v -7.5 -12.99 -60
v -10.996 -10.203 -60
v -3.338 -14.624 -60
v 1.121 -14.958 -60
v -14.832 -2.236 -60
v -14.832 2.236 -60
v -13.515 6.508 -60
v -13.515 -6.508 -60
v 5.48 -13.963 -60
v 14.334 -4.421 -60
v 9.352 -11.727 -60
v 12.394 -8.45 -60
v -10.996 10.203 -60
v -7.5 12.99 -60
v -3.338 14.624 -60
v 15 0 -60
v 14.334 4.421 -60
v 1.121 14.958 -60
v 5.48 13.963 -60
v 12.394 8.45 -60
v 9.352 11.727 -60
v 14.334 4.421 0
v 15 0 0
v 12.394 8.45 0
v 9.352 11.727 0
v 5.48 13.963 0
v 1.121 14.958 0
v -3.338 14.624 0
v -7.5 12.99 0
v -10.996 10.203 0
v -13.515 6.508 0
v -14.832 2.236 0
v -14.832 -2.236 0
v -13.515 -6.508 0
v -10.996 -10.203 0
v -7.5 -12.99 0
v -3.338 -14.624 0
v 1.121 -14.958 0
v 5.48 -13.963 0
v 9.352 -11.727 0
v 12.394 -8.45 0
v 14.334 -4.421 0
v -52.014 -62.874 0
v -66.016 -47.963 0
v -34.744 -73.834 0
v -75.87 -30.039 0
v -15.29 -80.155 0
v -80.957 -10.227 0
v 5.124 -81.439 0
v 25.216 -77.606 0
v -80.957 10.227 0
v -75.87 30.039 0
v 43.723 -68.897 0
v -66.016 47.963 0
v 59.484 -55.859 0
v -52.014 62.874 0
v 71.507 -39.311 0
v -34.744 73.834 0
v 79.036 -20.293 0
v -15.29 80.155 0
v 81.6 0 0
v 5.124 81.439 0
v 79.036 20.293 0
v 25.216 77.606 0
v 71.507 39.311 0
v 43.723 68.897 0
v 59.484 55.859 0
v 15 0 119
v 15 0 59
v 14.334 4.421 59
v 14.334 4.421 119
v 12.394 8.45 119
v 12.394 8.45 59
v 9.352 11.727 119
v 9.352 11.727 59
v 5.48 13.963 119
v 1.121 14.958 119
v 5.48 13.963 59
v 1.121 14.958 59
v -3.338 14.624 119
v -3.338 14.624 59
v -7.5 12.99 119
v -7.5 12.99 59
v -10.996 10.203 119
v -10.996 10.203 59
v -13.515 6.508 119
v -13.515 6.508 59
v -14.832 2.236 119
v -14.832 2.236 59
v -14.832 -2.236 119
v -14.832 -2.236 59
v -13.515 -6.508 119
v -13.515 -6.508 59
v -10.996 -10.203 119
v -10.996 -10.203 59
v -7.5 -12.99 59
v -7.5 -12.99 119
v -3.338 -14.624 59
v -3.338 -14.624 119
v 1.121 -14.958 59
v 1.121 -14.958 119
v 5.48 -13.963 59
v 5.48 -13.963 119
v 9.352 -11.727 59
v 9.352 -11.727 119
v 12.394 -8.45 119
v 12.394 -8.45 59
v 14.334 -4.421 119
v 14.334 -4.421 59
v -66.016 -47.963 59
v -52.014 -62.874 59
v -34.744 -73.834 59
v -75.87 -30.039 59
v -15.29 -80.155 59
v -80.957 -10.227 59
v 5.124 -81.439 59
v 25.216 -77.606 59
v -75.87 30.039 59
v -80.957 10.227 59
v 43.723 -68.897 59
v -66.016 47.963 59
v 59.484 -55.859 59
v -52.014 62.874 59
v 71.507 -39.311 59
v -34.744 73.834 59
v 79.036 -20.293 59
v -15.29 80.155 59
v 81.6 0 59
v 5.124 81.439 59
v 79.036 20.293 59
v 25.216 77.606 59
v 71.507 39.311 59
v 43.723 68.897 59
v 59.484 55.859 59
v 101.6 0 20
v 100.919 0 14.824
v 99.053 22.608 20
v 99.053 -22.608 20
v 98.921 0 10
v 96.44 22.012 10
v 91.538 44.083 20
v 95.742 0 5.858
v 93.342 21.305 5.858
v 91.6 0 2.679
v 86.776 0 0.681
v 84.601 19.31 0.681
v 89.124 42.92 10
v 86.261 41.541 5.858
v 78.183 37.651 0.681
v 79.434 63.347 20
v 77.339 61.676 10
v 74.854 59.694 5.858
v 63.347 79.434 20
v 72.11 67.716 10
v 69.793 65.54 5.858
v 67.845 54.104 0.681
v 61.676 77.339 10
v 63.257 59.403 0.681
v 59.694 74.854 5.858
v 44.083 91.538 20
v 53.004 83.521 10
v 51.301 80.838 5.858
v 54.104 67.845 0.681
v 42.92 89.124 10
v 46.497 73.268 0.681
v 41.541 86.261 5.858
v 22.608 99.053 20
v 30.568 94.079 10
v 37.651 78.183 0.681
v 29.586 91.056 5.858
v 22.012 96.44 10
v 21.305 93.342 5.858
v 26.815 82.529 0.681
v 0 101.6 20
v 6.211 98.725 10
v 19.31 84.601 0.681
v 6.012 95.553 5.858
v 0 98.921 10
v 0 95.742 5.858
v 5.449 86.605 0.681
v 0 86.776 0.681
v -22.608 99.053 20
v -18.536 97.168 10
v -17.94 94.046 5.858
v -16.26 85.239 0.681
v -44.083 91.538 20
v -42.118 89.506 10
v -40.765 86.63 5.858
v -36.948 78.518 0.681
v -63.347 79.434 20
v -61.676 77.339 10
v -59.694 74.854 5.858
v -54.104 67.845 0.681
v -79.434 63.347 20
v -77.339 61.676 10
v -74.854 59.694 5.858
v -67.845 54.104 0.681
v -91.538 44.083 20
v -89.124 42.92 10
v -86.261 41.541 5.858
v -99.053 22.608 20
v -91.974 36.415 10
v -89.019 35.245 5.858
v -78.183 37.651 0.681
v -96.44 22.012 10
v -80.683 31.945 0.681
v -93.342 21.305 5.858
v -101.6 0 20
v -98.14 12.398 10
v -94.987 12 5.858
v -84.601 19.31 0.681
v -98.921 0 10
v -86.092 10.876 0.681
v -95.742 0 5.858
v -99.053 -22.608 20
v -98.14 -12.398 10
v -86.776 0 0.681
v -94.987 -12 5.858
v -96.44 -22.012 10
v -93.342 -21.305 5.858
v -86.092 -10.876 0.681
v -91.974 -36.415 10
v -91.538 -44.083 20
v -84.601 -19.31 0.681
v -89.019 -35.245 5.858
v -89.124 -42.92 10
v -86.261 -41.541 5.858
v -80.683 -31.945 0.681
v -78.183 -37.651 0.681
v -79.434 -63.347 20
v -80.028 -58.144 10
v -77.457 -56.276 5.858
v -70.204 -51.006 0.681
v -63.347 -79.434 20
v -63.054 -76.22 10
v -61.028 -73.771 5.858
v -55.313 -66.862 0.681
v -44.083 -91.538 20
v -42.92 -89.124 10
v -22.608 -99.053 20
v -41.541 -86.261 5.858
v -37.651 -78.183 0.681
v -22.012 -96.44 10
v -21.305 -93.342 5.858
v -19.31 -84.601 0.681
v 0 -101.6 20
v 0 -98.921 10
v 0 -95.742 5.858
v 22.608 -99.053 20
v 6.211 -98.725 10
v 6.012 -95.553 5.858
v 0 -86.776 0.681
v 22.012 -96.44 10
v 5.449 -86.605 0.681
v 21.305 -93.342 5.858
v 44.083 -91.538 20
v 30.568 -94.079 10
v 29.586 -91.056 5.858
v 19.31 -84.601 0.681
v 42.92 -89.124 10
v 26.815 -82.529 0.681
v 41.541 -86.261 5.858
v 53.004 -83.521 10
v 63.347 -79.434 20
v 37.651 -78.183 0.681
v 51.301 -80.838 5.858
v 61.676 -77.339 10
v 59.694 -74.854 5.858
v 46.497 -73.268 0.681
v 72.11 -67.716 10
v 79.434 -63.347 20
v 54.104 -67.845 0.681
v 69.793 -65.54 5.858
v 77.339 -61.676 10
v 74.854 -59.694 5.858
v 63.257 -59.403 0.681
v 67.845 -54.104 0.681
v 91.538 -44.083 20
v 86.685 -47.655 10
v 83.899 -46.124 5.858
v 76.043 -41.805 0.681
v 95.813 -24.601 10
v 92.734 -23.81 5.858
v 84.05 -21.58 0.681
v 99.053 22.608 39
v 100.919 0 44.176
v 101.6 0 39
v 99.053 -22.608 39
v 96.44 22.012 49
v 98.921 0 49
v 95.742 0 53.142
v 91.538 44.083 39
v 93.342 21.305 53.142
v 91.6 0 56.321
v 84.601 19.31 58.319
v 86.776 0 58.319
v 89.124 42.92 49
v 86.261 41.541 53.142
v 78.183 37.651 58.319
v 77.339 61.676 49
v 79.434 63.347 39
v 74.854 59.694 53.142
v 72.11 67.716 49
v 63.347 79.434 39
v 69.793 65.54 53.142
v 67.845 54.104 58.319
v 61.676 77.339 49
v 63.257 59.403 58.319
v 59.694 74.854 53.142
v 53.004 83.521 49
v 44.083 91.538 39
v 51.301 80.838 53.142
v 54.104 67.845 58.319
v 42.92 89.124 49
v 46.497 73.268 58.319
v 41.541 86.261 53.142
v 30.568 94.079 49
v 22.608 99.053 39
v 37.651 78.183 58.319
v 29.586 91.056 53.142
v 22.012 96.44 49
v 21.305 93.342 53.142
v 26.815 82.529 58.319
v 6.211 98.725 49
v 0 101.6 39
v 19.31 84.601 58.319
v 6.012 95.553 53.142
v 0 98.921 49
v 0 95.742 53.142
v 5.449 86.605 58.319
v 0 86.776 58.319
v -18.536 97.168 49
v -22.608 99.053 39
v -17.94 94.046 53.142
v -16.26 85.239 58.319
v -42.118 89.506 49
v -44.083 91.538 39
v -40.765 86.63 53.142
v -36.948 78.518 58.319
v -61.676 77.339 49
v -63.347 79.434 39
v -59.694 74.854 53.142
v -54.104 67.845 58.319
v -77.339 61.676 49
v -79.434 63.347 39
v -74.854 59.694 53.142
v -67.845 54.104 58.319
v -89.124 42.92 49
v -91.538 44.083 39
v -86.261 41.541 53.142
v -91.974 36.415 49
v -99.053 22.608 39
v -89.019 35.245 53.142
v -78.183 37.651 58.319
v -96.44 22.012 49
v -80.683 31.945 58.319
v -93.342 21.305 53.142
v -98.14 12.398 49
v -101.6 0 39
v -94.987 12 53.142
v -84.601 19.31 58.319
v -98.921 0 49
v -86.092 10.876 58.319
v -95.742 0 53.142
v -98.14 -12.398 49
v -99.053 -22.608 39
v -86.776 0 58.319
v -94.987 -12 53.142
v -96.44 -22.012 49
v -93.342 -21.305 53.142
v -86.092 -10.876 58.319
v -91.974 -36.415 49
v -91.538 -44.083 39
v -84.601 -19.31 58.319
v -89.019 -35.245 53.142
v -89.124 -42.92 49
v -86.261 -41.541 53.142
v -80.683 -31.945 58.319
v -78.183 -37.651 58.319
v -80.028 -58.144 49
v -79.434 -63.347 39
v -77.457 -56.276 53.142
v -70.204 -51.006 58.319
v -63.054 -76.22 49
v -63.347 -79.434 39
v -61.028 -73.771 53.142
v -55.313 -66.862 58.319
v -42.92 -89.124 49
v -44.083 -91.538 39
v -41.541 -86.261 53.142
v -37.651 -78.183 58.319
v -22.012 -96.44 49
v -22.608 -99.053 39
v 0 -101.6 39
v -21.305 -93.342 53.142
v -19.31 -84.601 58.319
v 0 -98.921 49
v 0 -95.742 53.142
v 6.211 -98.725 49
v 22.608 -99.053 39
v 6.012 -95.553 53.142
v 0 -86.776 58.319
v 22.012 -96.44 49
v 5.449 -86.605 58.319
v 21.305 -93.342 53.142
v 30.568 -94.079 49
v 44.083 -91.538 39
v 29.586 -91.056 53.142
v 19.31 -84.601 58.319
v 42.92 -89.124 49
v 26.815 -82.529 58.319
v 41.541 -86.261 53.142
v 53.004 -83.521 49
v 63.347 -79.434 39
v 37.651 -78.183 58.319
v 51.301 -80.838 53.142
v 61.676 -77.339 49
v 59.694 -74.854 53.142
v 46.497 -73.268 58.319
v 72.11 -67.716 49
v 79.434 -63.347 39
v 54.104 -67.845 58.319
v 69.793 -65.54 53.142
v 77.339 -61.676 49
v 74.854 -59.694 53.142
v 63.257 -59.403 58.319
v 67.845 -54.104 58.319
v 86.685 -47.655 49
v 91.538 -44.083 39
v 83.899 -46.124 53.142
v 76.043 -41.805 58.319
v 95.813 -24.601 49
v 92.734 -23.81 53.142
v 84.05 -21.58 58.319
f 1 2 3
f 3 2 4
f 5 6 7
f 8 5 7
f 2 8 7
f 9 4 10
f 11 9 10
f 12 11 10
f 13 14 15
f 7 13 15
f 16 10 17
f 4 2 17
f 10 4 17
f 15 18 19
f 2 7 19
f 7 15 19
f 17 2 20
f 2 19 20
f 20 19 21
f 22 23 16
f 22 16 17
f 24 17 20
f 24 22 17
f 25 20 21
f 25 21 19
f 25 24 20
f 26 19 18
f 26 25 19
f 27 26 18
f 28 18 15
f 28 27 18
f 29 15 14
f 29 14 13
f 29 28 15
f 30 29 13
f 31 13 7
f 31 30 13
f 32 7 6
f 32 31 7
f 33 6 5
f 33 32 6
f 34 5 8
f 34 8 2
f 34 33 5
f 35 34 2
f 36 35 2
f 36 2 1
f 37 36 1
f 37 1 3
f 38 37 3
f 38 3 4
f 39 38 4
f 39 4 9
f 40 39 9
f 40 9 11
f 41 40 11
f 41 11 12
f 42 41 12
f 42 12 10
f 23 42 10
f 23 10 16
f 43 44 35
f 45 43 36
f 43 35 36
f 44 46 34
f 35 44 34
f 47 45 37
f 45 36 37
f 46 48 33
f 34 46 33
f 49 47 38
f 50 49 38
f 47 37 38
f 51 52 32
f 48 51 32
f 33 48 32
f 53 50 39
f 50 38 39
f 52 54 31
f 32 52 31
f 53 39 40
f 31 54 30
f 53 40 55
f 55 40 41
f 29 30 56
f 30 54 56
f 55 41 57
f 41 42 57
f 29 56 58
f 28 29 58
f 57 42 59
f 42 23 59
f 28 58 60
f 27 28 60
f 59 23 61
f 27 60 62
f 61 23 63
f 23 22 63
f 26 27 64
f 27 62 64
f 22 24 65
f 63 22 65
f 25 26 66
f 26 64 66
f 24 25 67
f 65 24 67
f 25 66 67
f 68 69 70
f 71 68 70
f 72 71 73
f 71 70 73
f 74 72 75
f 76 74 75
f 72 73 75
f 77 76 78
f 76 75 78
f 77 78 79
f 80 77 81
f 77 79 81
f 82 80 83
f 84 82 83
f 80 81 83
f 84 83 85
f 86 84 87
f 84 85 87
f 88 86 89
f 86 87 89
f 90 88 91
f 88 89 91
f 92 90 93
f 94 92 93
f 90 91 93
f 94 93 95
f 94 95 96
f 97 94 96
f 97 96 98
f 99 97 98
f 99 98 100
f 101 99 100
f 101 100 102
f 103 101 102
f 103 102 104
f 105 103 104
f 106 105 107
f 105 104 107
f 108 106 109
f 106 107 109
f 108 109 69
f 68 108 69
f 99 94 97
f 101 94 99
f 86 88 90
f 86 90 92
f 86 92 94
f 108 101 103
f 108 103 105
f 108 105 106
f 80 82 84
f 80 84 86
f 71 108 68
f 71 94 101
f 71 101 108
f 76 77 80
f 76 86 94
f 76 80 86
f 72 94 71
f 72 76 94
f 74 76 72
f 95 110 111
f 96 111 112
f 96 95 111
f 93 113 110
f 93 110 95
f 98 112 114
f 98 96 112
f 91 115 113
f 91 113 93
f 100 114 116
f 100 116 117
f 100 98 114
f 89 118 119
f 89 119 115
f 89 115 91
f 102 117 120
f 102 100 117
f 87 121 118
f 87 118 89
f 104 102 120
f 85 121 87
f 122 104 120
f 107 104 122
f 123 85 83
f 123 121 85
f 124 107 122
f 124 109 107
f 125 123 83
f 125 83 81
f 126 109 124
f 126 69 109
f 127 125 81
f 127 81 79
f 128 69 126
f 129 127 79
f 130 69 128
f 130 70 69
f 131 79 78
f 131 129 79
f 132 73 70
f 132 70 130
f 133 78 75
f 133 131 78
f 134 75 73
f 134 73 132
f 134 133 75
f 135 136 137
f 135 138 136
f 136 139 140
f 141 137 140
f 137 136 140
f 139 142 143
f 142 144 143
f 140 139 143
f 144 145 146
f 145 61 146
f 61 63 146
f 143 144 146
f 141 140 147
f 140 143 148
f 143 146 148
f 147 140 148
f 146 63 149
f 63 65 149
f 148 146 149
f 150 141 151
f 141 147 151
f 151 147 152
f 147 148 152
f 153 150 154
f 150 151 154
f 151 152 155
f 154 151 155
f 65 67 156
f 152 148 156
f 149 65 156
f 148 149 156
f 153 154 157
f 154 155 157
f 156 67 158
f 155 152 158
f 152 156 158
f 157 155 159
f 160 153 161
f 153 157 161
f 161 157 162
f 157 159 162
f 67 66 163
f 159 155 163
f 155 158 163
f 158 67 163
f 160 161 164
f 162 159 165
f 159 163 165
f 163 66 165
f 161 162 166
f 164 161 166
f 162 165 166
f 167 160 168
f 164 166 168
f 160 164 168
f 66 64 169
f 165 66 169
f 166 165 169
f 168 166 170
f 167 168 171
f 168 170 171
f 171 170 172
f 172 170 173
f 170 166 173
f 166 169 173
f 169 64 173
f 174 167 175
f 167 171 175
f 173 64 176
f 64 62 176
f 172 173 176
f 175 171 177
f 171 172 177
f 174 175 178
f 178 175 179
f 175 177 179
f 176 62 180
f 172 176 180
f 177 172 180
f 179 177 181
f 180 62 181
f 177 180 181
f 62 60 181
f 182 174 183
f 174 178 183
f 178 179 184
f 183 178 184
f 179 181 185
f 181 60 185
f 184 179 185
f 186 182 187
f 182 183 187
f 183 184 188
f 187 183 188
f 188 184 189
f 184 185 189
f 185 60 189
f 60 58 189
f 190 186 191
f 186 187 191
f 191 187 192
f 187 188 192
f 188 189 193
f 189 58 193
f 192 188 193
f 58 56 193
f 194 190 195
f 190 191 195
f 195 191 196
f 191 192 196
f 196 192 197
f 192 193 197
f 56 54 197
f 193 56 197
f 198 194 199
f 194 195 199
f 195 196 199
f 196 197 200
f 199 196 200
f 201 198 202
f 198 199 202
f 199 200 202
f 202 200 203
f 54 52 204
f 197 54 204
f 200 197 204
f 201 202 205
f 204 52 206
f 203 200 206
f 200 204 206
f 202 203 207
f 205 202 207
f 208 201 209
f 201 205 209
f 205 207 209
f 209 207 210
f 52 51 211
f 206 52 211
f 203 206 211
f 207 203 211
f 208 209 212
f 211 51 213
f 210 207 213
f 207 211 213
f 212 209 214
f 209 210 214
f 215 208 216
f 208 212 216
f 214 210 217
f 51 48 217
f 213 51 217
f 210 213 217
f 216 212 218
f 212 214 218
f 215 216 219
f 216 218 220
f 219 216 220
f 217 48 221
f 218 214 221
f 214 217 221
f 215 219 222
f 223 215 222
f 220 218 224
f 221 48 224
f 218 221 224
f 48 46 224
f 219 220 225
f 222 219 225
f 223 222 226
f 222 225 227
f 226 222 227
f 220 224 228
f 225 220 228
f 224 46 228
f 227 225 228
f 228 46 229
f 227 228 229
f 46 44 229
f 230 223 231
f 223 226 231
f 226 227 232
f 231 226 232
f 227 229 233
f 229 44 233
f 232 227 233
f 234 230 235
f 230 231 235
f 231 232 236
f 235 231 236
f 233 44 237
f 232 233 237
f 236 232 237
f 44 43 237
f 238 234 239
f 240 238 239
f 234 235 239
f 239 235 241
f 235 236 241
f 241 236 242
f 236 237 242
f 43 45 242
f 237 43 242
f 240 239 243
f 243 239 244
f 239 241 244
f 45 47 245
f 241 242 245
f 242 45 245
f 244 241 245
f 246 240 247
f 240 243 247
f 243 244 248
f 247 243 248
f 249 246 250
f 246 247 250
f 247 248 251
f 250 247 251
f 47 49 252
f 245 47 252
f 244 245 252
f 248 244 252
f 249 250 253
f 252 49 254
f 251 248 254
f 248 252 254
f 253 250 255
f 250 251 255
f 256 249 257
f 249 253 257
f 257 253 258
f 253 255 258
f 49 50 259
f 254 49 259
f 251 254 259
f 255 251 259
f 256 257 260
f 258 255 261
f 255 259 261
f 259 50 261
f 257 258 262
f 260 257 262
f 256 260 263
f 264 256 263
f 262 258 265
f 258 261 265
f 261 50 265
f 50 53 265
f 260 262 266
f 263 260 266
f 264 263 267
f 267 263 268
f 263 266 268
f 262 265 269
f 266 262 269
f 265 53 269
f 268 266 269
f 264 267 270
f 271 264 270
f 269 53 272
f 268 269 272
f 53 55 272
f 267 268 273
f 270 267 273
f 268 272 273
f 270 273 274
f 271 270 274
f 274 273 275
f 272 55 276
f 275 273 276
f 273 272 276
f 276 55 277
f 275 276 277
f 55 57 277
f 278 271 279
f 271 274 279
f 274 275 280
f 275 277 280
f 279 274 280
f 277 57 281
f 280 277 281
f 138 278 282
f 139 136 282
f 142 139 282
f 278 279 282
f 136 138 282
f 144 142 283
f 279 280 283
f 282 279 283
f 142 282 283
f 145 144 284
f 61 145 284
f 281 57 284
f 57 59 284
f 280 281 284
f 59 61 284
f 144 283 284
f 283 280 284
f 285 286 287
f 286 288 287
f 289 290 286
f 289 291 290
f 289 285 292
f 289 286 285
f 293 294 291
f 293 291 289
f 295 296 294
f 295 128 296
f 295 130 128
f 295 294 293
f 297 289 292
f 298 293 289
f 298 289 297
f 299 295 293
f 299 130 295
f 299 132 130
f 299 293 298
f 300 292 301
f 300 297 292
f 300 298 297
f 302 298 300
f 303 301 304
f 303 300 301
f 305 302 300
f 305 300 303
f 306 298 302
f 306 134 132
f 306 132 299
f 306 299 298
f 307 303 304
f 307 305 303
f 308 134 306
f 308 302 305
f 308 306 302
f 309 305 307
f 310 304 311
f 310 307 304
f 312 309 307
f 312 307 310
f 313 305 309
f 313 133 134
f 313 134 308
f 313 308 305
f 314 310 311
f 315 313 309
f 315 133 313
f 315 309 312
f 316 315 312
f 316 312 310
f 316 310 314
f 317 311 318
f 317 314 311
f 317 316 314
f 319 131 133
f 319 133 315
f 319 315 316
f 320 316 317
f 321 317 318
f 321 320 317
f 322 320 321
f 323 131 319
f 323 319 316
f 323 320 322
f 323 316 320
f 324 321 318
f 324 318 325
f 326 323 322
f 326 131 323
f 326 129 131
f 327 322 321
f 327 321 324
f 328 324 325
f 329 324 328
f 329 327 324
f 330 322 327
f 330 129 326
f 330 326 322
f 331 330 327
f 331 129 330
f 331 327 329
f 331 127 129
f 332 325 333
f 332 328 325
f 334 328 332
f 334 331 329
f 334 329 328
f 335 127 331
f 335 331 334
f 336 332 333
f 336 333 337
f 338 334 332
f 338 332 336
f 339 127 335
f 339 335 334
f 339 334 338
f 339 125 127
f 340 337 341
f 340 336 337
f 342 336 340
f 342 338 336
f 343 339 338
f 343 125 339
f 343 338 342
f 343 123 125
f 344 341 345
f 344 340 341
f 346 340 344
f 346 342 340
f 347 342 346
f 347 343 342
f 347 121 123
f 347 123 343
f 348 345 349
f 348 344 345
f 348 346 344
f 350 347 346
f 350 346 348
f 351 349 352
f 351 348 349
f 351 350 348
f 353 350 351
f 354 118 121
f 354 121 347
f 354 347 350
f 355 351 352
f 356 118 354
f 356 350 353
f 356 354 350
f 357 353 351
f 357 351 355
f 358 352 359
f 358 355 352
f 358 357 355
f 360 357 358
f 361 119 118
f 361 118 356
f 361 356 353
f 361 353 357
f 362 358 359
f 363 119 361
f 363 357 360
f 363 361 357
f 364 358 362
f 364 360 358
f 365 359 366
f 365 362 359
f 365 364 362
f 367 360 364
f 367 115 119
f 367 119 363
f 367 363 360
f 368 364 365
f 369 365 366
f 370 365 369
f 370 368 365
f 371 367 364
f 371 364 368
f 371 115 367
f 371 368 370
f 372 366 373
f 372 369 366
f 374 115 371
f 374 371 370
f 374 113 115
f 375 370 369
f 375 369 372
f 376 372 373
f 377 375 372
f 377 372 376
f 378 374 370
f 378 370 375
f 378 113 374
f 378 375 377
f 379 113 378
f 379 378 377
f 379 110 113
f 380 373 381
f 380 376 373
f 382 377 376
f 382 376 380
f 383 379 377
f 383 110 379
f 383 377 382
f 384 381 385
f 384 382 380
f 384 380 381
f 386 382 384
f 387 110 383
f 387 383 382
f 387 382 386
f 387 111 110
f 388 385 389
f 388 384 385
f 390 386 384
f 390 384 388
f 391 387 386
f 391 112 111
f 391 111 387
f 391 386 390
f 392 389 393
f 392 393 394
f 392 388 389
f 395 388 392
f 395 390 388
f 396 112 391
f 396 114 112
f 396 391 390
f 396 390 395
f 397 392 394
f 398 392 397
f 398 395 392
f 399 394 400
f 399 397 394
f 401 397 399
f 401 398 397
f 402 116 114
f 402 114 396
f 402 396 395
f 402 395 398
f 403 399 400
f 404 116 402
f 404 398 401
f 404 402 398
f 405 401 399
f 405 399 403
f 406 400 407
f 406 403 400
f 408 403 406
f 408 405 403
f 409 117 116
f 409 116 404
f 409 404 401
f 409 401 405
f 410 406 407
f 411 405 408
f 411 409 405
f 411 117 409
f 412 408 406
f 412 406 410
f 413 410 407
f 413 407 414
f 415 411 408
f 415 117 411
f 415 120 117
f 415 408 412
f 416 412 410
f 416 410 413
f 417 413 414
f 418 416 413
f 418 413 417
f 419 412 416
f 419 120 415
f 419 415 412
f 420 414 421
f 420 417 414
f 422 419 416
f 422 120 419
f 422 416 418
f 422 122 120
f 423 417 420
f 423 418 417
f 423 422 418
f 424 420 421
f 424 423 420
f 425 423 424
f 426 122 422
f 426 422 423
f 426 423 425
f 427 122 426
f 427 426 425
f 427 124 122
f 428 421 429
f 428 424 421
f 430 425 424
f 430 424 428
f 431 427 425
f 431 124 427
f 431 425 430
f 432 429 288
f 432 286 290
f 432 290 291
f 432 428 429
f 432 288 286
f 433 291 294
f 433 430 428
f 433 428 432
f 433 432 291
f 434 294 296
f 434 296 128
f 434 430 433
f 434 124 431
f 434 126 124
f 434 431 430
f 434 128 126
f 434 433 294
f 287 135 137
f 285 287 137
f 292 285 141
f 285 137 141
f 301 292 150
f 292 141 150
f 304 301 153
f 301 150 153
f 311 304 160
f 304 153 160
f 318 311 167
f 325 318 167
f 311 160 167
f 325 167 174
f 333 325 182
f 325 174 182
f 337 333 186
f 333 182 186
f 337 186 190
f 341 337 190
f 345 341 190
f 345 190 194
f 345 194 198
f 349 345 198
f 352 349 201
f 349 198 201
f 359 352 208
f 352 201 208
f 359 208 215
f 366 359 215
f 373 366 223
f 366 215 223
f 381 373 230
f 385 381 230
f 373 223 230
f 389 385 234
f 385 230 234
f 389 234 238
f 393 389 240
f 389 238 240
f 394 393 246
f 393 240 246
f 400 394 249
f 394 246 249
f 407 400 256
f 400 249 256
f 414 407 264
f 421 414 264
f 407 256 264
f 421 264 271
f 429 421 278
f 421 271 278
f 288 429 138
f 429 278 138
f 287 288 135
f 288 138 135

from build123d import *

# Parameters (mm, degrees)
SKETCH1_R                = 101.6
BOSS_EXTRUDE1_DEPTH      = 59
FILLET1_R                = 20
SKETCH2_R                = 15
BOSS_EXTRUDE2_DEPTH      = 60
BOSS_EXTRUDE2_DEPTH_BACK = 119


with BuildPart() as part:
    # Sketch1 → Boss-Extrude1 (new body)
    with BuildSketch(Plane.XY):
        Circle(SKETCH1_R)
    extrude(amount=BOSS_EXTRUDE1_DEPTH)

    # Fillet1
    fillet1_edges = [part.edges().sort_by_distance(p)[0] for p in [
        (-101.6, 0, 0),
        (-101.6, 0, 59),
    ]]
    fillet(fillet1_edges, radius=FILLET1_R)

    # Sketch2 → Boss-Extrude2 (add, two sides)
    with BuildSketch(Plane.XY.offset(59)) as boss_extrude2_sk:
        Circle(SKETCH2_R)
    extrude(amount=BOSS_EXTRUDE2_DEPTH)
    extrude(boss_extrude2_sk.sketch, amount=-BOSS_EXTRUDE2_DEPTH_BACK)


solid = part.part
